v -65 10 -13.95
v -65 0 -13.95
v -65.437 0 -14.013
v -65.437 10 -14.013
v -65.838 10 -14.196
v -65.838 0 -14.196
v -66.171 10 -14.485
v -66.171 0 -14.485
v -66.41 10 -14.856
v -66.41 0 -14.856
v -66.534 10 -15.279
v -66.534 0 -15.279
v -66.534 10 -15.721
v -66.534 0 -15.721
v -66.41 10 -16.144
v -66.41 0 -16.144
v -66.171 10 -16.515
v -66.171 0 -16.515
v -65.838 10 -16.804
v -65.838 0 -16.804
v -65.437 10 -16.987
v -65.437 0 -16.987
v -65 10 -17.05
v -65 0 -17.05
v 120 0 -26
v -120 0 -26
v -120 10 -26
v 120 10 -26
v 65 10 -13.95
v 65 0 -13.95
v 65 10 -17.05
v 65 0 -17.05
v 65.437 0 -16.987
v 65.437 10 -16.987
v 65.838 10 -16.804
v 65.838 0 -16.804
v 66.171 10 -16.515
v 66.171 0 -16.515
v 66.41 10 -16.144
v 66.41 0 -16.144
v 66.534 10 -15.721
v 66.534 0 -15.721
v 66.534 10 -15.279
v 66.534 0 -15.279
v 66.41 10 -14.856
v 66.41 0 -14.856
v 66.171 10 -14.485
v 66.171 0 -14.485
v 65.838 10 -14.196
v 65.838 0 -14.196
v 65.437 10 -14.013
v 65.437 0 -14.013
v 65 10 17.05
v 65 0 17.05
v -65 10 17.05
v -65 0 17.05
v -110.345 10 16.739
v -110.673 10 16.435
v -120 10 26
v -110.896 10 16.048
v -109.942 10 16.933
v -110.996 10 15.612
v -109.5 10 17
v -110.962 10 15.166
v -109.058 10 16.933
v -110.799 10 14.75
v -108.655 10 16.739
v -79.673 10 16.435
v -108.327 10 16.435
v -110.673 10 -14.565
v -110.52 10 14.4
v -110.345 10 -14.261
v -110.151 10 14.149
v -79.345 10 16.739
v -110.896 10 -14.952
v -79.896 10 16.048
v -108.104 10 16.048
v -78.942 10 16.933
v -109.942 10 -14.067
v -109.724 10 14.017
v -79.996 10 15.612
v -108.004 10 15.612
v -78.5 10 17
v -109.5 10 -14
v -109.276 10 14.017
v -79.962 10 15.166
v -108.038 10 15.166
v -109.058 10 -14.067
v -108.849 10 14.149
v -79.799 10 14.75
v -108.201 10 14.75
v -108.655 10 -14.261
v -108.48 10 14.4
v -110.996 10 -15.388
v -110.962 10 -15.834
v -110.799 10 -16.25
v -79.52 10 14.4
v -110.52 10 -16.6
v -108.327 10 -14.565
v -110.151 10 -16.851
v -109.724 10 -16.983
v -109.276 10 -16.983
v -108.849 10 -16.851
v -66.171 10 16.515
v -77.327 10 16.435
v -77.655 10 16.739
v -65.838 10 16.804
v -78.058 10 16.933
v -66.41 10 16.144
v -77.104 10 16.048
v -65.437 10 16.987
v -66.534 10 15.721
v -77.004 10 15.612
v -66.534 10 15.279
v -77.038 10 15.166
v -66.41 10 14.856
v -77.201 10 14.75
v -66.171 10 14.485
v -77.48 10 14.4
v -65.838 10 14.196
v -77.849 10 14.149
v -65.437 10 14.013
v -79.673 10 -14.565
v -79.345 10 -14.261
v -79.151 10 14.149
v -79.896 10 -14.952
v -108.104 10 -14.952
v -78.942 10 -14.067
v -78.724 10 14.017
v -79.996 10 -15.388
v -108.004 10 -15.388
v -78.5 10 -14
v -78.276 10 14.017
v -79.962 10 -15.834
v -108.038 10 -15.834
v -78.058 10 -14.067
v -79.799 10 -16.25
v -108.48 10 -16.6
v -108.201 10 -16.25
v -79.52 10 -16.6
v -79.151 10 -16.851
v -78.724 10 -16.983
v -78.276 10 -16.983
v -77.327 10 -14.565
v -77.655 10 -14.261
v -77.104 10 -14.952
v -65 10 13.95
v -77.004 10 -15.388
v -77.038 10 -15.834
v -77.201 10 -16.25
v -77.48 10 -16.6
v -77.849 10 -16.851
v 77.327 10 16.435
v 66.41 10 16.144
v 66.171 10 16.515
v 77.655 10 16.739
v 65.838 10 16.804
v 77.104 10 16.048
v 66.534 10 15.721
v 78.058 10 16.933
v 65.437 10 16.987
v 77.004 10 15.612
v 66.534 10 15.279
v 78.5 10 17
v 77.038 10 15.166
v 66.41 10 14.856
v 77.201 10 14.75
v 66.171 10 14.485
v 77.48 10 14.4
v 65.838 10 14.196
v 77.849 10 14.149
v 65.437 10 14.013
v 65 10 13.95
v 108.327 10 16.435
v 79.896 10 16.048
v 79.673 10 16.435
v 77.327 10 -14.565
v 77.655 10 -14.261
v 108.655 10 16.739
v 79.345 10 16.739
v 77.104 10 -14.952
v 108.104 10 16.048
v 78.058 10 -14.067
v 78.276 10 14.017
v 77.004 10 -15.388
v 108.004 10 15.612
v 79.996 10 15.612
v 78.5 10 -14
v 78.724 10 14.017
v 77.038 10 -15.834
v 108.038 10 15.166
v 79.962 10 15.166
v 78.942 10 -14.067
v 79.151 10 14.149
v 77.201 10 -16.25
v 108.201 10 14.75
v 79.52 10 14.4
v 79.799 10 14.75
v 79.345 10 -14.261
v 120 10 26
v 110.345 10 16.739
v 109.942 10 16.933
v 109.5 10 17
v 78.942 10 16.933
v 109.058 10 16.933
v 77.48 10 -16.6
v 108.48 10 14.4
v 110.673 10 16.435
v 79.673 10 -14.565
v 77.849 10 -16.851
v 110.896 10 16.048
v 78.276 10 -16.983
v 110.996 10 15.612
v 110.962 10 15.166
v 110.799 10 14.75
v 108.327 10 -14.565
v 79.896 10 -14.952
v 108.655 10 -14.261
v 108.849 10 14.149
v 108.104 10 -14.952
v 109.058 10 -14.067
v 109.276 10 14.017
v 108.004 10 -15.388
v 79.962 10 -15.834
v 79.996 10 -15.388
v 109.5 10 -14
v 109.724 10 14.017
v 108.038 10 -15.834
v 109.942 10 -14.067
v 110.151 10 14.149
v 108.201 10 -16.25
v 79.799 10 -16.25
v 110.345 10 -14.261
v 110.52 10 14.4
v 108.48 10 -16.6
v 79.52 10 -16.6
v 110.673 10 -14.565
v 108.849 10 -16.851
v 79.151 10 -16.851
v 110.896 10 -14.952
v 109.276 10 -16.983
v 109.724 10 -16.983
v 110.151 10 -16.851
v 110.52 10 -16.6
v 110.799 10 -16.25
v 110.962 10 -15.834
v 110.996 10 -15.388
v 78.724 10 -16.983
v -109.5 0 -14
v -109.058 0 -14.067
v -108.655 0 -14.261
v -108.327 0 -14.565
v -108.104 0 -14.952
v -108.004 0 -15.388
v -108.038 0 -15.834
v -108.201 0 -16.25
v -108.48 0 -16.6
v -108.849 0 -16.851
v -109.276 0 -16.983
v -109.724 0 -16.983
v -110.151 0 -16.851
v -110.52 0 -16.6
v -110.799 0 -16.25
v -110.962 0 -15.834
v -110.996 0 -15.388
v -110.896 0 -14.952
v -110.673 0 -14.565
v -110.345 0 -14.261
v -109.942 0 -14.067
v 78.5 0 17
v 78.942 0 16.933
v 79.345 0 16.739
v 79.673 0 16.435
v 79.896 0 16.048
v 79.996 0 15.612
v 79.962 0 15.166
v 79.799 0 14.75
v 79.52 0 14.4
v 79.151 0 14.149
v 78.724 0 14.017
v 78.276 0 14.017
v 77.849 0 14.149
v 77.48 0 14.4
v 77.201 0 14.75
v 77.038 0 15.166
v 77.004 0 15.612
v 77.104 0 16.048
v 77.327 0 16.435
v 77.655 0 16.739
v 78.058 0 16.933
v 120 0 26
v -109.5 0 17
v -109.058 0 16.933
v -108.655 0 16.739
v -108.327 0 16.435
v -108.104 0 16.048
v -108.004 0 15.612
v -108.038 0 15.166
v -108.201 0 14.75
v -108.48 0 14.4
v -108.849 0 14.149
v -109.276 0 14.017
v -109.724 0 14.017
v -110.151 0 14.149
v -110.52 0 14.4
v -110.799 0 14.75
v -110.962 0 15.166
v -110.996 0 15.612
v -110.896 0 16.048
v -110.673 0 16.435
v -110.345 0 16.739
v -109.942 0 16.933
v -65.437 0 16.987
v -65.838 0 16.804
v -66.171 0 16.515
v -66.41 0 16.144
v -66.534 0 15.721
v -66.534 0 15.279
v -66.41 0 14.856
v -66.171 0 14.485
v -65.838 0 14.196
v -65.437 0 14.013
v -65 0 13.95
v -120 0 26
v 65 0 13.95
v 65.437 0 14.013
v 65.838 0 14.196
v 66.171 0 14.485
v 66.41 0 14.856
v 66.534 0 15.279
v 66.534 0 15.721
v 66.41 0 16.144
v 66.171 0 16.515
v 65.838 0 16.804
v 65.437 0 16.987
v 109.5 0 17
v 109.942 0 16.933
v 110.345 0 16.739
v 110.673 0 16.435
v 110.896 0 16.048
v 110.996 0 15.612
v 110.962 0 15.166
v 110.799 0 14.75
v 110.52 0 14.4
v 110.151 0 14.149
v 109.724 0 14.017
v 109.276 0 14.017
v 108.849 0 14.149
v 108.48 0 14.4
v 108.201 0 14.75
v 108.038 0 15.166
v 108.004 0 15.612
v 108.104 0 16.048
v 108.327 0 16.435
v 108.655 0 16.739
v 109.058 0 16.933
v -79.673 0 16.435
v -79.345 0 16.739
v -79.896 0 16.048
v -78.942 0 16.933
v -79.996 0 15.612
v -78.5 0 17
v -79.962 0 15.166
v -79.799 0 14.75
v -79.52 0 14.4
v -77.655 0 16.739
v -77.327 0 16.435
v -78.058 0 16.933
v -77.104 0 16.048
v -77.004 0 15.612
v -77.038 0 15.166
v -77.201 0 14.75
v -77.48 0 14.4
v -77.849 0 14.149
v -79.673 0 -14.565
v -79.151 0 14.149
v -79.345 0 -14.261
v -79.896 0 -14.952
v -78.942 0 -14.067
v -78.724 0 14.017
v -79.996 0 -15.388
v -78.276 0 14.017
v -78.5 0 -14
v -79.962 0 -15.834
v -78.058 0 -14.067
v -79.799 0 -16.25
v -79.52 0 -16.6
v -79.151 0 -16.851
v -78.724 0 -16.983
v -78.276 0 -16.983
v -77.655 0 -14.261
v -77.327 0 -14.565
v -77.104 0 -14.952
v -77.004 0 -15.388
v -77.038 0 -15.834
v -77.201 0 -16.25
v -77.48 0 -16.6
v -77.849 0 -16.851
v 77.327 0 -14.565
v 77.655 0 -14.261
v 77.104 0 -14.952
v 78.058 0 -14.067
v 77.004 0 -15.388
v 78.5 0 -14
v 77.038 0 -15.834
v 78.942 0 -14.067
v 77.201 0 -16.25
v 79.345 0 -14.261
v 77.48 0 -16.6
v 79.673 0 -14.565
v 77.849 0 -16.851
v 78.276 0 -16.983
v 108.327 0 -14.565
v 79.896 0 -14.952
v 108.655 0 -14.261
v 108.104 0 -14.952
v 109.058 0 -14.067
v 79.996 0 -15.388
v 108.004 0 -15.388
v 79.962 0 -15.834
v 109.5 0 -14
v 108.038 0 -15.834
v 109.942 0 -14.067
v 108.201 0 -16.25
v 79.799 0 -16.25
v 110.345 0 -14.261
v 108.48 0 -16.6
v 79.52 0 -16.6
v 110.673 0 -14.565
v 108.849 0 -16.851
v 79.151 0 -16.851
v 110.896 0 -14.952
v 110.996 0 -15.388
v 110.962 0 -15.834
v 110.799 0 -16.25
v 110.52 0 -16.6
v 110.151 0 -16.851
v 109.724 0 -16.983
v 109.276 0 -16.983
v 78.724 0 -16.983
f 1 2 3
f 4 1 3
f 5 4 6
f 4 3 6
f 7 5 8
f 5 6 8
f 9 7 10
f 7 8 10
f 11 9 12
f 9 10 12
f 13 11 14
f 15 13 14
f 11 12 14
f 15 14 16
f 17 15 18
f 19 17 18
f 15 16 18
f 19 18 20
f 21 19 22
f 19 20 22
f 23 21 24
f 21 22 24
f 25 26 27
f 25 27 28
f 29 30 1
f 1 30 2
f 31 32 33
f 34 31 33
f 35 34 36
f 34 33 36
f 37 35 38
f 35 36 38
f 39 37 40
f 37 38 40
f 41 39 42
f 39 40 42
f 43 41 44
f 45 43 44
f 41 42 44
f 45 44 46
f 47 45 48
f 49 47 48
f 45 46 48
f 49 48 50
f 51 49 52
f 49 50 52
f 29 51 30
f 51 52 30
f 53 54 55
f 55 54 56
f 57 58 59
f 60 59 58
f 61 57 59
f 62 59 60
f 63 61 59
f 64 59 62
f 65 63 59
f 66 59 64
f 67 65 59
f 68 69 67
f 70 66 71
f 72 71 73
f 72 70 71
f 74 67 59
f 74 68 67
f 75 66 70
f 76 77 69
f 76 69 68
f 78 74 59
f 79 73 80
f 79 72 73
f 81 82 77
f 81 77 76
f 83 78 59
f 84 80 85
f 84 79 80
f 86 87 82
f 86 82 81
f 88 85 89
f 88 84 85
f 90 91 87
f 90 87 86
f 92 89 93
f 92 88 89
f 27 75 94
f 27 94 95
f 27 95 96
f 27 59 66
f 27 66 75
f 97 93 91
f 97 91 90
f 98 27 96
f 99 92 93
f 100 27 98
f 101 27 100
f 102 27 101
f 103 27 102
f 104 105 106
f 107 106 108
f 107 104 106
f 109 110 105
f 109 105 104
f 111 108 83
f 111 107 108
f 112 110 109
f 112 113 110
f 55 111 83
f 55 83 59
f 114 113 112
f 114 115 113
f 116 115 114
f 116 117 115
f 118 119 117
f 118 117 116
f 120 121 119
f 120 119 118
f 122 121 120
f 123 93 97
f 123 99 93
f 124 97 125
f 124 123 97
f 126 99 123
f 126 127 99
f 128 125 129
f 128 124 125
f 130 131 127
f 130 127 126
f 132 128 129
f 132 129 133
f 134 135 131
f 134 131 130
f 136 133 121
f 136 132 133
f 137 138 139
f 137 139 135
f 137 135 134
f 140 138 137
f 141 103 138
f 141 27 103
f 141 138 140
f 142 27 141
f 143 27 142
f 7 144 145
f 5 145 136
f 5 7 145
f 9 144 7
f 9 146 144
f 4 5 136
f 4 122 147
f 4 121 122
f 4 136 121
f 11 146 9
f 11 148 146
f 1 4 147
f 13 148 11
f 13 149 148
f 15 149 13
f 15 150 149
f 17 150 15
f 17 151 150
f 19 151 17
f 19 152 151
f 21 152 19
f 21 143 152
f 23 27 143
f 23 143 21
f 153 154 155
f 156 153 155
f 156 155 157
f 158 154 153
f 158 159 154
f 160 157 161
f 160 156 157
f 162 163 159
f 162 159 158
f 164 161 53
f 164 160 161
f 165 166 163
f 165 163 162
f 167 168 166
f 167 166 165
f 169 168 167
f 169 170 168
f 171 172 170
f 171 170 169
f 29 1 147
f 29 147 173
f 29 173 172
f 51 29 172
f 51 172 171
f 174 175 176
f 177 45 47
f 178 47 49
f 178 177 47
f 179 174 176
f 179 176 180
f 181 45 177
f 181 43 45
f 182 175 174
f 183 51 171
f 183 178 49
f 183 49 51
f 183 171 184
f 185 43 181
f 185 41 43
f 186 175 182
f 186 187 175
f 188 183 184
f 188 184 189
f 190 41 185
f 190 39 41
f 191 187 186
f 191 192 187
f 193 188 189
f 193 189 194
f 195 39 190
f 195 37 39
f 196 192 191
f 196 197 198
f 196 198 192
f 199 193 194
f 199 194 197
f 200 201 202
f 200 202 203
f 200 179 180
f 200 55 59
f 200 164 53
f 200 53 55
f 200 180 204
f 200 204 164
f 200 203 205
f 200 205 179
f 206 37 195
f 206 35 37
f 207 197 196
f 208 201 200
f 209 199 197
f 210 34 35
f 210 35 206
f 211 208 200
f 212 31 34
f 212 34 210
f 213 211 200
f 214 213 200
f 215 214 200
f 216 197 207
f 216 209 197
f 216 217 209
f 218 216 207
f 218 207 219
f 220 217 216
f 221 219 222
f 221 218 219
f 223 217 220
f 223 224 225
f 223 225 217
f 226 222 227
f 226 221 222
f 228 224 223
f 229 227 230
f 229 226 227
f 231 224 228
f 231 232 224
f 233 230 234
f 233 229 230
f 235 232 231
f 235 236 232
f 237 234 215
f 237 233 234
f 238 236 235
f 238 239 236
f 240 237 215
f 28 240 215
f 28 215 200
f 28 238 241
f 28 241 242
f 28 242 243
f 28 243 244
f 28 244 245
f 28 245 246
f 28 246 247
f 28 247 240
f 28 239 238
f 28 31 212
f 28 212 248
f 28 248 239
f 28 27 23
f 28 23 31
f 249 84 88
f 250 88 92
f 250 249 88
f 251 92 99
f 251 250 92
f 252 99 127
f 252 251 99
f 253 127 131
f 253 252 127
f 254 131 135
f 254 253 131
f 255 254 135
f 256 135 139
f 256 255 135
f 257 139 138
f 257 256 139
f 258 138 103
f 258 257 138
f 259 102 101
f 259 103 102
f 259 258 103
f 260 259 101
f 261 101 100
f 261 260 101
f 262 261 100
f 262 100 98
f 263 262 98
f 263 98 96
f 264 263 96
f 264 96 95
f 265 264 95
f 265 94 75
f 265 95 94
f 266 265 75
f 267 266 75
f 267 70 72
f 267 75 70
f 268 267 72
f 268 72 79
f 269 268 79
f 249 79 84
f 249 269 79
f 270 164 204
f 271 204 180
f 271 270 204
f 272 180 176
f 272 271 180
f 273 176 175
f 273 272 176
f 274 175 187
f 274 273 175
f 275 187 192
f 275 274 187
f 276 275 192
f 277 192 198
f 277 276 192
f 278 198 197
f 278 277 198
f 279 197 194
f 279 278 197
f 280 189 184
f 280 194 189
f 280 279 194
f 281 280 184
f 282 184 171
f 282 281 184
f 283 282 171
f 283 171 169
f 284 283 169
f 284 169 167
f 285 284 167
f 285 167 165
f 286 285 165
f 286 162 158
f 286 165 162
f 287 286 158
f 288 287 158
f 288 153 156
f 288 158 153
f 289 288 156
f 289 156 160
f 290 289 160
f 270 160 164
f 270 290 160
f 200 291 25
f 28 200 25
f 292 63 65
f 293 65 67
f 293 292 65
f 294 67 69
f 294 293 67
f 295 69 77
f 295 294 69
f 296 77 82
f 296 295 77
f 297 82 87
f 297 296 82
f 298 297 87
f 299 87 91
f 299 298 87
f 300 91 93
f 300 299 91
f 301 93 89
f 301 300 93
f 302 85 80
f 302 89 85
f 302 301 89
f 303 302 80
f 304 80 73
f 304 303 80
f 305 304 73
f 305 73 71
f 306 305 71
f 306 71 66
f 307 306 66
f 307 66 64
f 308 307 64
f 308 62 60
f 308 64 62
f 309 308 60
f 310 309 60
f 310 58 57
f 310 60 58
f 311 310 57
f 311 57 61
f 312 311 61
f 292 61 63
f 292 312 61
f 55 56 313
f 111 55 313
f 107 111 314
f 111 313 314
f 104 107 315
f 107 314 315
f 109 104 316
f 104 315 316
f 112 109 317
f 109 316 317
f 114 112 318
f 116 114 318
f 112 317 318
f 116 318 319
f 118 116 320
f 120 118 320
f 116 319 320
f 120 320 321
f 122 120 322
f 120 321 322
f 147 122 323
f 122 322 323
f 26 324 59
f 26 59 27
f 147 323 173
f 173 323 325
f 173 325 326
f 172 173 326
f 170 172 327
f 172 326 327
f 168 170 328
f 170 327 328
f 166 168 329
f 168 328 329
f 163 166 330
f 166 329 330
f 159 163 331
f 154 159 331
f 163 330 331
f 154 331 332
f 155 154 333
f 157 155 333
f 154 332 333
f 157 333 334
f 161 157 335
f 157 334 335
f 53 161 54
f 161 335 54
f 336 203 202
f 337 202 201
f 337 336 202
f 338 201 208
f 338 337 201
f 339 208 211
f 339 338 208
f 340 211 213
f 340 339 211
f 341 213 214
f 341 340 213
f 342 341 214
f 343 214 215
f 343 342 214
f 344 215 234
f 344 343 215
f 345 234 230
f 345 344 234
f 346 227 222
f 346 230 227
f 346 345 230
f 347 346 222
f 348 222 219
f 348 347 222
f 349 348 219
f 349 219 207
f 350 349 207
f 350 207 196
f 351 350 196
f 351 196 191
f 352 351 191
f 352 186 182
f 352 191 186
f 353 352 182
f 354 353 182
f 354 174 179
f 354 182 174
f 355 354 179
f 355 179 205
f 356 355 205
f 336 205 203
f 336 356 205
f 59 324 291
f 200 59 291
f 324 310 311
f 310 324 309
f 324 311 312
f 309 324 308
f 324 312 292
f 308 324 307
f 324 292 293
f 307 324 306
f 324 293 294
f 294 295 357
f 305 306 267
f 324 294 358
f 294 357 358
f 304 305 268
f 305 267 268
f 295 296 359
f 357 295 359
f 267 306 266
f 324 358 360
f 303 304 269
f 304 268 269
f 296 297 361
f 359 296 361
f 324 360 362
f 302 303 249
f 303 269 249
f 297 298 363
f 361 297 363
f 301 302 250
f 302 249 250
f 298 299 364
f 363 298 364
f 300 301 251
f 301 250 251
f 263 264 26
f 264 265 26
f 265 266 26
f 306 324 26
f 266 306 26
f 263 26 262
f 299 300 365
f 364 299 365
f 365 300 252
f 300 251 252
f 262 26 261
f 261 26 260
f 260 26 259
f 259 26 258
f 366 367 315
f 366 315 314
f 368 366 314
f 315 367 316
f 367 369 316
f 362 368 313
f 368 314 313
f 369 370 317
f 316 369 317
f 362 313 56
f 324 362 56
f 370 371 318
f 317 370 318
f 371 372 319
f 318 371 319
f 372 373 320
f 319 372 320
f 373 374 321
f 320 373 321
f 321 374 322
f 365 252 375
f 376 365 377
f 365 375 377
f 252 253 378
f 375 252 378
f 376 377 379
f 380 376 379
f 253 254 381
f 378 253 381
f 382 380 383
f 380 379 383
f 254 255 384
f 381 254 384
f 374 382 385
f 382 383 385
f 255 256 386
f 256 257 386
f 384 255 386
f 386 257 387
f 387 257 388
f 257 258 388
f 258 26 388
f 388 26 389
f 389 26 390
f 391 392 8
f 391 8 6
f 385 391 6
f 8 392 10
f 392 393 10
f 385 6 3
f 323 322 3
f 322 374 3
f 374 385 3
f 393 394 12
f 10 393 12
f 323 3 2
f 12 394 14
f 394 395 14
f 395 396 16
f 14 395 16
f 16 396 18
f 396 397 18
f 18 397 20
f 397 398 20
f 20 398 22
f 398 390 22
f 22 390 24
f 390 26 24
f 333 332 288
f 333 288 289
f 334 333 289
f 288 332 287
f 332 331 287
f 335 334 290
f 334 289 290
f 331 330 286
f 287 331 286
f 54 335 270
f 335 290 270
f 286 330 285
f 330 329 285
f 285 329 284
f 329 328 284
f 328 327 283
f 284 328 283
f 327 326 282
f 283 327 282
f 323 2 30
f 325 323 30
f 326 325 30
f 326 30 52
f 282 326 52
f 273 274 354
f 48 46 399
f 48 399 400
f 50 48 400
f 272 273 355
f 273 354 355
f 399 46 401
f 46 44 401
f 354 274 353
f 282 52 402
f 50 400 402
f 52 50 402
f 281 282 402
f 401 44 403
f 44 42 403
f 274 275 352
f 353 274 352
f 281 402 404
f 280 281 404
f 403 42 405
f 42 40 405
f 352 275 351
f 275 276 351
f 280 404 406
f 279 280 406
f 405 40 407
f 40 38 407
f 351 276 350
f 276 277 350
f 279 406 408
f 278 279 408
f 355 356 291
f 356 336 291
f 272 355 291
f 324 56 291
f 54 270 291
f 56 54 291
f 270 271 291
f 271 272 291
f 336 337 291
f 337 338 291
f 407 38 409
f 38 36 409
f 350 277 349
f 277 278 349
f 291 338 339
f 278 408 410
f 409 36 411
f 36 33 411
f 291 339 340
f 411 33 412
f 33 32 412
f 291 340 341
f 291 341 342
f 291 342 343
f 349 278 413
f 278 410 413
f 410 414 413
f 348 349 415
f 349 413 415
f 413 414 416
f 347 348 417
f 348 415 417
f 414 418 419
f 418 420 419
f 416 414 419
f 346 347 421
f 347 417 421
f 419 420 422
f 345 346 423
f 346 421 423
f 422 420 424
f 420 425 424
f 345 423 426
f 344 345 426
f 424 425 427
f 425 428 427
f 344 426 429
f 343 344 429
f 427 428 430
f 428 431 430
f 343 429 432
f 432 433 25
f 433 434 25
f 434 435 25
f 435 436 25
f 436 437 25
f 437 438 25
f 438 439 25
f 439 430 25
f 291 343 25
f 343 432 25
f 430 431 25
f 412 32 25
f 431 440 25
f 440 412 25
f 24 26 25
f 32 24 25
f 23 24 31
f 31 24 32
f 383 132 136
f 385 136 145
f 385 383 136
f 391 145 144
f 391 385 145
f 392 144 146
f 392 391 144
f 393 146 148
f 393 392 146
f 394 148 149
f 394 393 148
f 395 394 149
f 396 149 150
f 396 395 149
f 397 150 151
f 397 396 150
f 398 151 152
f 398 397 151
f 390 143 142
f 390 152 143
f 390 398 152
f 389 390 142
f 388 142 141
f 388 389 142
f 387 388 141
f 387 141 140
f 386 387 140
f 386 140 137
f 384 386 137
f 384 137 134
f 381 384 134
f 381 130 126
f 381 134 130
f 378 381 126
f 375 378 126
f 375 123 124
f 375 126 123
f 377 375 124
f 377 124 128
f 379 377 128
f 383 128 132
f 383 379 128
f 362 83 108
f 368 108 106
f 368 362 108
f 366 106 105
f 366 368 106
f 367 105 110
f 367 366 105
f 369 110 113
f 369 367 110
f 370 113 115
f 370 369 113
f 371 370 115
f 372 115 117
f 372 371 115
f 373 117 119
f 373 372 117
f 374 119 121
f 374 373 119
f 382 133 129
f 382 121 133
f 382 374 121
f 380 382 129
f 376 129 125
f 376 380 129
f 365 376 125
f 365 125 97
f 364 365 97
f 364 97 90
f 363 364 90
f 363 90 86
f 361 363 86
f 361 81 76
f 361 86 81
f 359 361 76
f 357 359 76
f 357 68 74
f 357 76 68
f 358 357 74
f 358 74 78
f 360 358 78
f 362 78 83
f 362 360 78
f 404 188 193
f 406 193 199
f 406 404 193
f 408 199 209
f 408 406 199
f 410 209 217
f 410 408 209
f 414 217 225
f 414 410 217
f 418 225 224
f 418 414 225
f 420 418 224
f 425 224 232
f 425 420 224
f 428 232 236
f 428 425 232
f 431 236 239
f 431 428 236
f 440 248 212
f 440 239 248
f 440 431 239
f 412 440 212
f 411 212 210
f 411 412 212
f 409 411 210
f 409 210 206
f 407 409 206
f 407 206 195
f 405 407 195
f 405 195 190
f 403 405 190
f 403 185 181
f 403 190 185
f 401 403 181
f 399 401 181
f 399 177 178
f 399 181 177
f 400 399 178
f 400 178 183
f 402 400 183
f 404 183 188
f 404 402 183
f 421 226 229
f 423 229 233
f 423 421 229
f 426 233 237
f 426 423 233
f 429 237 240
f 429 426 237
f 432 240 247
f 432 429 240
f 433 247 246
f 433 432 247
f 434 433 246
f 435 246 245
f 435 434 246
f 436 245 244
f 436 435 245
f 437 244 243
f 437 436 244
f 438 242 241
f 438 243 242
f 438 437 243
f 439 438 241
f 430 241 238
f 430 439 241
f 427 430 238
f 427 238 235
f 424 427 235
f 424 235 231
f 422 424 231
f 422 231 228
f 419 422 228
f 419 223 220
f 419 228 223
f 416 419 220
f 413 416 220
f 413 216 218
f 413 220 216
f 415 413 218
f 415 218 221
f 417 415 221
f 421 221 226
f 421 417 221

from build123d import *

# Parameters (mm, degrees)
SKETCH_12_W         = 240
SKETCH_12_H         = 52
EXTRUDE_1_DEPTH     = 10
CUT_EXTRUDE_4_REACH = 125.191
SKETCH_11_R         = 1.5


with BuildPart() as part:
    # 草图12 → 凸台-拉伸1 (new body)
    with BuildSketch(Plane(origin=(0, 0, 0), x_dir=(1, 0, 0), z_dir=(0, 1, 0))):
        Rectangle(SKETCH_12_W, SKETCH_12_H)
    extrude(amount=EXTRUDE_1_DEPTH)

    # 草图11 → 切除-拉伸4 (cut, up to next)
    with BuildSketch(Plane(origin=(0, 0, 0), x_dir=(1, 0, 0), z_dir=(0, 1, 0)), mode=Mode.PRIVATE) as cut_extrude_4_sk1:
        with Locations(Location((-109.5, 15.5, 0), (0, 0, 270))):
            Circle(SKETCH_11_R)
    cut_extrude_4_tool1 = extrude(cut_extrude_4_sk1.sketch, amount=CUT_EXTRUDE_4_REACH, mode=Mode.PRIVATE) & part.part
    # 草图11 → 切除-拉伸4 (cut, up to next)
    with BuildSketch(Plane(origin=(0, 0, 0), x_dir=(1, 0, 0), z_dir=(0, 1, 0)), mode=Mode.PRIVATE) as cut_extrude_4_sk2:
        with Locations(Location((-78.5, 15.5, 0), (0, 0, 270))):
            Circle(SKETCH_11_R)
    cut_extrude_4_tool2 = extrude(cut_extrude_4_sk2.sketch, amount=CUT_EXTRUDE_4_REACH, mode=Mode.PRIVATE) & part.part
    # 草图11 → 切除-拉伸4 (cut, up to next)
    with BuildSketch(Plane(origin=(0, 0, 0), x_dir=(1, 0, 0), z_dir=(0, 1, 0)), mode=Mode.PRIVATE) as cut_extrude_4_sk3:
        with Locations(Location((-109.5, -15.5, 0), (0, 0, 270))):
            Circle(SKETCH_11_R)
    cut_extrude_4_tool3 = extrude(cut_extrude_4_sk3.sketch, amount=CUT_EXTRUDE_4_REACH, mode=Mode.PRIVATE) & part.part
    # 草图11 → 切除-拉伸4 (cut, up to next)
    with BuildSketch(Plane(origin=(0, 0, 0), x_dir=(1, 0, 0), z_dir=(0, 1, 0)), mode=Mode.PRIVATE) as cut_extrude_4_sk4:
        with Locations(Location((-78.5, -15.5, 0), (0, 0, 270))):
            Circle(SKETCH_11_R)
    cut_extrude_4_tool4 = extrude(cut_extrude_4_sk4.sketch, amount=CUT_EXTRUDE_4_REACH, mode=Mode.PRIVATE) & part.part
    # 草图11 → 切除-拉伸4 (cut, up to next)
    with BuildSketch(Plane(origin=(0, 0, 0), x_dir=(1, 0, 0), z_dir=(0, 1, 0)), mode=Mode.PRIVATE) as cut_extrude_4_sk5:
        with Locations(Location((78.5, 15.5, 0), (0, 0, 270))):
            Circle(SKETCH_11_R)
    cut_extrude_4_tool5 = extrude(cut_extrude_4_sk5.sketch, amount=CUT_EXTRUDE_4_REACH, mode=Mode.PRIVATE) & part.part
    # 草图11 → 切除-拉伸4 (cut, up to next)
    with BuildSketch(Plane(origin=(0, 0, 0), x_dir=(1, 0, 0), z_dir=(0, 1, 0)), mode=Mode.PRIVATE) as cut_extrude_4_sk6:
        with Locations(Location((109.5, 15.5, 0), (0, 0, 270))):
            Circle(SKETCH_11_R)
    cut_extrude_4_tool6 = extrude(cut_extrude_4_sk6.sketch, amount=CUT_EXTRUDE_4_REACH, mode=Mode.PRIVATE) & part.part
    # 草图11 → 切除-拉伸4 (cut, up to next)
    with BuildSketch(Plane(origin=(0, 0, 0), x_dir=(1, 0, 0), z_dir=(0, 1, 0)), mode=Mode.PRIVATE) as cut_extrude_4_sk7:
        with Locations(Location((109.5, -15.5, 0), (0, 0, 270))):
            Circle(SKETCH_11_R)
    cut_extrude_4_tool7 = extrude(cut_extrude_4_sk7.sketch, amount=CUT_EXTRUDE_4_REACH, mode=Mode.PRIVATE) & part.part
    # 草图11 → 切除-拉伸4 (cut, up to next)
    with BuildSketch(Plane(origin=(0, 0, 0), x_dir=(1, 0, 0), z_dir=(0, 1, 0)), mode=Mode.PRIVATE) as cut_extrude_4_sk8:
        with Locations(Location((78.5, -15.5, 0), (0, 0, 270))):
            Circle(SKETCH_11_R)
    cut_extrude_4_tool8 = extrude(cut_extrude_4_sk8.sketch, amount=CUT_EXTRUDE_4_REACH, mode=Mode.PRIVATE) & part.part
    # 草图11 → 切除-拉伸4 (cut, up to next)
    with BuildSketch(Plane(origin=(0, 0, 0), x_dir=(1, 0, 0), z_dir=(0, 1, 0)), mode=Mode.PRIVATE) as cut_extrude_4_sk9:
        with BuildLine():
            Line((-65, 17.05), (65, 17.05))
            ThreePointArc((65, 17.05), (66.55, 15.5), (65, 13.95))
            Line((65, 13.95), (-65, 13.95))
            ThreePointArc((-65, 13.95), (-66.55, 15.5), (-65, 17.05))
        make_face()
    cut_extrude_4_tool9 = extrude(cut_extrude_4_sk9.sketch, amount=CUT_EXTRUDE_4_REACH, mode=Mode.PRIVATE) & part.part
    # 草图11 → 切除-拉伸4 (cut, up to next)
    with BuildSketch(Plane(origin=(0, 0, 0), x_dir=(1, 0, 0), z_dir=(0, 1, 0)), mode=Mode.PRIVATE) as cut_extrude_4_sk10:
        with BuildLine():
            Line((-65, -13.95), (65, -13.95))
            ThreePointArc((65, -13.95), (66.55, -15.5), (65, -17.05))
            Line((65, -17.05), (-65, -17.05))
            ThreePointArc((-65, -17.05), (-66.55, -15.5), (-65, -13.95))
        make_face()
    cut_extrude_4_tool10 = extrude(cut_extrude_4_sk10.sketch, amount=CUT_EXTRUDE_4_REACH, mode=Mode.PRIVATE) & part.part
    add(cut_extrude_4_tool1.solids().sort_by_distance((-109.5, 0, -15.5))[0], mode=Mode.SUBTRACT)
    add(cut_extrude_4_tool2.solids().sort_by_distance((-78.5, 0, -15.5))[0], mode=Mode.SUBTRACT)
    add(cut_extrude_4_tool3.solids().sort_by_distance((-109.5, 0, 15.5))[0], mode=Mode.SUBTRACT)
    add(cut_extrude_4_tool4.solids().sort_by_distance((-78.5, 0, 15.5))[0], mode=Mode.SUBTRACT)
    add(cut_extrude_4_tool5.solids().sort_by_distance((78.5, 0, -15.5))[0], mode=Mode.SUBTRACT)
    add(cut_extrude_4_tool6.solids().sort_by_distance((109.5, 0, -15.5))[0], mode=Mode.SUBTRACT)
    add(cut_extrude_4_tool7.solids().sort_by_distance((109.5, 0, 15.5))[0], mode=Mode.SUBTRACT)
    add(cut_extrude_4_tool8.solids().sort_by_distance((78.5, 0, 15.5))[0], mode=Mode.SUBTRACT)
    add(cut_extrude_4_tool9.solids().sort_by_distance((0, 0, -15.5))[0], mode=Mode.SUBTRACT)
    add(cut_extrude_4_tool10.solids().sort_by_distance((0, 0, 15.5))[0], mode=Mode.SUBTRACT)


solid = part.part
